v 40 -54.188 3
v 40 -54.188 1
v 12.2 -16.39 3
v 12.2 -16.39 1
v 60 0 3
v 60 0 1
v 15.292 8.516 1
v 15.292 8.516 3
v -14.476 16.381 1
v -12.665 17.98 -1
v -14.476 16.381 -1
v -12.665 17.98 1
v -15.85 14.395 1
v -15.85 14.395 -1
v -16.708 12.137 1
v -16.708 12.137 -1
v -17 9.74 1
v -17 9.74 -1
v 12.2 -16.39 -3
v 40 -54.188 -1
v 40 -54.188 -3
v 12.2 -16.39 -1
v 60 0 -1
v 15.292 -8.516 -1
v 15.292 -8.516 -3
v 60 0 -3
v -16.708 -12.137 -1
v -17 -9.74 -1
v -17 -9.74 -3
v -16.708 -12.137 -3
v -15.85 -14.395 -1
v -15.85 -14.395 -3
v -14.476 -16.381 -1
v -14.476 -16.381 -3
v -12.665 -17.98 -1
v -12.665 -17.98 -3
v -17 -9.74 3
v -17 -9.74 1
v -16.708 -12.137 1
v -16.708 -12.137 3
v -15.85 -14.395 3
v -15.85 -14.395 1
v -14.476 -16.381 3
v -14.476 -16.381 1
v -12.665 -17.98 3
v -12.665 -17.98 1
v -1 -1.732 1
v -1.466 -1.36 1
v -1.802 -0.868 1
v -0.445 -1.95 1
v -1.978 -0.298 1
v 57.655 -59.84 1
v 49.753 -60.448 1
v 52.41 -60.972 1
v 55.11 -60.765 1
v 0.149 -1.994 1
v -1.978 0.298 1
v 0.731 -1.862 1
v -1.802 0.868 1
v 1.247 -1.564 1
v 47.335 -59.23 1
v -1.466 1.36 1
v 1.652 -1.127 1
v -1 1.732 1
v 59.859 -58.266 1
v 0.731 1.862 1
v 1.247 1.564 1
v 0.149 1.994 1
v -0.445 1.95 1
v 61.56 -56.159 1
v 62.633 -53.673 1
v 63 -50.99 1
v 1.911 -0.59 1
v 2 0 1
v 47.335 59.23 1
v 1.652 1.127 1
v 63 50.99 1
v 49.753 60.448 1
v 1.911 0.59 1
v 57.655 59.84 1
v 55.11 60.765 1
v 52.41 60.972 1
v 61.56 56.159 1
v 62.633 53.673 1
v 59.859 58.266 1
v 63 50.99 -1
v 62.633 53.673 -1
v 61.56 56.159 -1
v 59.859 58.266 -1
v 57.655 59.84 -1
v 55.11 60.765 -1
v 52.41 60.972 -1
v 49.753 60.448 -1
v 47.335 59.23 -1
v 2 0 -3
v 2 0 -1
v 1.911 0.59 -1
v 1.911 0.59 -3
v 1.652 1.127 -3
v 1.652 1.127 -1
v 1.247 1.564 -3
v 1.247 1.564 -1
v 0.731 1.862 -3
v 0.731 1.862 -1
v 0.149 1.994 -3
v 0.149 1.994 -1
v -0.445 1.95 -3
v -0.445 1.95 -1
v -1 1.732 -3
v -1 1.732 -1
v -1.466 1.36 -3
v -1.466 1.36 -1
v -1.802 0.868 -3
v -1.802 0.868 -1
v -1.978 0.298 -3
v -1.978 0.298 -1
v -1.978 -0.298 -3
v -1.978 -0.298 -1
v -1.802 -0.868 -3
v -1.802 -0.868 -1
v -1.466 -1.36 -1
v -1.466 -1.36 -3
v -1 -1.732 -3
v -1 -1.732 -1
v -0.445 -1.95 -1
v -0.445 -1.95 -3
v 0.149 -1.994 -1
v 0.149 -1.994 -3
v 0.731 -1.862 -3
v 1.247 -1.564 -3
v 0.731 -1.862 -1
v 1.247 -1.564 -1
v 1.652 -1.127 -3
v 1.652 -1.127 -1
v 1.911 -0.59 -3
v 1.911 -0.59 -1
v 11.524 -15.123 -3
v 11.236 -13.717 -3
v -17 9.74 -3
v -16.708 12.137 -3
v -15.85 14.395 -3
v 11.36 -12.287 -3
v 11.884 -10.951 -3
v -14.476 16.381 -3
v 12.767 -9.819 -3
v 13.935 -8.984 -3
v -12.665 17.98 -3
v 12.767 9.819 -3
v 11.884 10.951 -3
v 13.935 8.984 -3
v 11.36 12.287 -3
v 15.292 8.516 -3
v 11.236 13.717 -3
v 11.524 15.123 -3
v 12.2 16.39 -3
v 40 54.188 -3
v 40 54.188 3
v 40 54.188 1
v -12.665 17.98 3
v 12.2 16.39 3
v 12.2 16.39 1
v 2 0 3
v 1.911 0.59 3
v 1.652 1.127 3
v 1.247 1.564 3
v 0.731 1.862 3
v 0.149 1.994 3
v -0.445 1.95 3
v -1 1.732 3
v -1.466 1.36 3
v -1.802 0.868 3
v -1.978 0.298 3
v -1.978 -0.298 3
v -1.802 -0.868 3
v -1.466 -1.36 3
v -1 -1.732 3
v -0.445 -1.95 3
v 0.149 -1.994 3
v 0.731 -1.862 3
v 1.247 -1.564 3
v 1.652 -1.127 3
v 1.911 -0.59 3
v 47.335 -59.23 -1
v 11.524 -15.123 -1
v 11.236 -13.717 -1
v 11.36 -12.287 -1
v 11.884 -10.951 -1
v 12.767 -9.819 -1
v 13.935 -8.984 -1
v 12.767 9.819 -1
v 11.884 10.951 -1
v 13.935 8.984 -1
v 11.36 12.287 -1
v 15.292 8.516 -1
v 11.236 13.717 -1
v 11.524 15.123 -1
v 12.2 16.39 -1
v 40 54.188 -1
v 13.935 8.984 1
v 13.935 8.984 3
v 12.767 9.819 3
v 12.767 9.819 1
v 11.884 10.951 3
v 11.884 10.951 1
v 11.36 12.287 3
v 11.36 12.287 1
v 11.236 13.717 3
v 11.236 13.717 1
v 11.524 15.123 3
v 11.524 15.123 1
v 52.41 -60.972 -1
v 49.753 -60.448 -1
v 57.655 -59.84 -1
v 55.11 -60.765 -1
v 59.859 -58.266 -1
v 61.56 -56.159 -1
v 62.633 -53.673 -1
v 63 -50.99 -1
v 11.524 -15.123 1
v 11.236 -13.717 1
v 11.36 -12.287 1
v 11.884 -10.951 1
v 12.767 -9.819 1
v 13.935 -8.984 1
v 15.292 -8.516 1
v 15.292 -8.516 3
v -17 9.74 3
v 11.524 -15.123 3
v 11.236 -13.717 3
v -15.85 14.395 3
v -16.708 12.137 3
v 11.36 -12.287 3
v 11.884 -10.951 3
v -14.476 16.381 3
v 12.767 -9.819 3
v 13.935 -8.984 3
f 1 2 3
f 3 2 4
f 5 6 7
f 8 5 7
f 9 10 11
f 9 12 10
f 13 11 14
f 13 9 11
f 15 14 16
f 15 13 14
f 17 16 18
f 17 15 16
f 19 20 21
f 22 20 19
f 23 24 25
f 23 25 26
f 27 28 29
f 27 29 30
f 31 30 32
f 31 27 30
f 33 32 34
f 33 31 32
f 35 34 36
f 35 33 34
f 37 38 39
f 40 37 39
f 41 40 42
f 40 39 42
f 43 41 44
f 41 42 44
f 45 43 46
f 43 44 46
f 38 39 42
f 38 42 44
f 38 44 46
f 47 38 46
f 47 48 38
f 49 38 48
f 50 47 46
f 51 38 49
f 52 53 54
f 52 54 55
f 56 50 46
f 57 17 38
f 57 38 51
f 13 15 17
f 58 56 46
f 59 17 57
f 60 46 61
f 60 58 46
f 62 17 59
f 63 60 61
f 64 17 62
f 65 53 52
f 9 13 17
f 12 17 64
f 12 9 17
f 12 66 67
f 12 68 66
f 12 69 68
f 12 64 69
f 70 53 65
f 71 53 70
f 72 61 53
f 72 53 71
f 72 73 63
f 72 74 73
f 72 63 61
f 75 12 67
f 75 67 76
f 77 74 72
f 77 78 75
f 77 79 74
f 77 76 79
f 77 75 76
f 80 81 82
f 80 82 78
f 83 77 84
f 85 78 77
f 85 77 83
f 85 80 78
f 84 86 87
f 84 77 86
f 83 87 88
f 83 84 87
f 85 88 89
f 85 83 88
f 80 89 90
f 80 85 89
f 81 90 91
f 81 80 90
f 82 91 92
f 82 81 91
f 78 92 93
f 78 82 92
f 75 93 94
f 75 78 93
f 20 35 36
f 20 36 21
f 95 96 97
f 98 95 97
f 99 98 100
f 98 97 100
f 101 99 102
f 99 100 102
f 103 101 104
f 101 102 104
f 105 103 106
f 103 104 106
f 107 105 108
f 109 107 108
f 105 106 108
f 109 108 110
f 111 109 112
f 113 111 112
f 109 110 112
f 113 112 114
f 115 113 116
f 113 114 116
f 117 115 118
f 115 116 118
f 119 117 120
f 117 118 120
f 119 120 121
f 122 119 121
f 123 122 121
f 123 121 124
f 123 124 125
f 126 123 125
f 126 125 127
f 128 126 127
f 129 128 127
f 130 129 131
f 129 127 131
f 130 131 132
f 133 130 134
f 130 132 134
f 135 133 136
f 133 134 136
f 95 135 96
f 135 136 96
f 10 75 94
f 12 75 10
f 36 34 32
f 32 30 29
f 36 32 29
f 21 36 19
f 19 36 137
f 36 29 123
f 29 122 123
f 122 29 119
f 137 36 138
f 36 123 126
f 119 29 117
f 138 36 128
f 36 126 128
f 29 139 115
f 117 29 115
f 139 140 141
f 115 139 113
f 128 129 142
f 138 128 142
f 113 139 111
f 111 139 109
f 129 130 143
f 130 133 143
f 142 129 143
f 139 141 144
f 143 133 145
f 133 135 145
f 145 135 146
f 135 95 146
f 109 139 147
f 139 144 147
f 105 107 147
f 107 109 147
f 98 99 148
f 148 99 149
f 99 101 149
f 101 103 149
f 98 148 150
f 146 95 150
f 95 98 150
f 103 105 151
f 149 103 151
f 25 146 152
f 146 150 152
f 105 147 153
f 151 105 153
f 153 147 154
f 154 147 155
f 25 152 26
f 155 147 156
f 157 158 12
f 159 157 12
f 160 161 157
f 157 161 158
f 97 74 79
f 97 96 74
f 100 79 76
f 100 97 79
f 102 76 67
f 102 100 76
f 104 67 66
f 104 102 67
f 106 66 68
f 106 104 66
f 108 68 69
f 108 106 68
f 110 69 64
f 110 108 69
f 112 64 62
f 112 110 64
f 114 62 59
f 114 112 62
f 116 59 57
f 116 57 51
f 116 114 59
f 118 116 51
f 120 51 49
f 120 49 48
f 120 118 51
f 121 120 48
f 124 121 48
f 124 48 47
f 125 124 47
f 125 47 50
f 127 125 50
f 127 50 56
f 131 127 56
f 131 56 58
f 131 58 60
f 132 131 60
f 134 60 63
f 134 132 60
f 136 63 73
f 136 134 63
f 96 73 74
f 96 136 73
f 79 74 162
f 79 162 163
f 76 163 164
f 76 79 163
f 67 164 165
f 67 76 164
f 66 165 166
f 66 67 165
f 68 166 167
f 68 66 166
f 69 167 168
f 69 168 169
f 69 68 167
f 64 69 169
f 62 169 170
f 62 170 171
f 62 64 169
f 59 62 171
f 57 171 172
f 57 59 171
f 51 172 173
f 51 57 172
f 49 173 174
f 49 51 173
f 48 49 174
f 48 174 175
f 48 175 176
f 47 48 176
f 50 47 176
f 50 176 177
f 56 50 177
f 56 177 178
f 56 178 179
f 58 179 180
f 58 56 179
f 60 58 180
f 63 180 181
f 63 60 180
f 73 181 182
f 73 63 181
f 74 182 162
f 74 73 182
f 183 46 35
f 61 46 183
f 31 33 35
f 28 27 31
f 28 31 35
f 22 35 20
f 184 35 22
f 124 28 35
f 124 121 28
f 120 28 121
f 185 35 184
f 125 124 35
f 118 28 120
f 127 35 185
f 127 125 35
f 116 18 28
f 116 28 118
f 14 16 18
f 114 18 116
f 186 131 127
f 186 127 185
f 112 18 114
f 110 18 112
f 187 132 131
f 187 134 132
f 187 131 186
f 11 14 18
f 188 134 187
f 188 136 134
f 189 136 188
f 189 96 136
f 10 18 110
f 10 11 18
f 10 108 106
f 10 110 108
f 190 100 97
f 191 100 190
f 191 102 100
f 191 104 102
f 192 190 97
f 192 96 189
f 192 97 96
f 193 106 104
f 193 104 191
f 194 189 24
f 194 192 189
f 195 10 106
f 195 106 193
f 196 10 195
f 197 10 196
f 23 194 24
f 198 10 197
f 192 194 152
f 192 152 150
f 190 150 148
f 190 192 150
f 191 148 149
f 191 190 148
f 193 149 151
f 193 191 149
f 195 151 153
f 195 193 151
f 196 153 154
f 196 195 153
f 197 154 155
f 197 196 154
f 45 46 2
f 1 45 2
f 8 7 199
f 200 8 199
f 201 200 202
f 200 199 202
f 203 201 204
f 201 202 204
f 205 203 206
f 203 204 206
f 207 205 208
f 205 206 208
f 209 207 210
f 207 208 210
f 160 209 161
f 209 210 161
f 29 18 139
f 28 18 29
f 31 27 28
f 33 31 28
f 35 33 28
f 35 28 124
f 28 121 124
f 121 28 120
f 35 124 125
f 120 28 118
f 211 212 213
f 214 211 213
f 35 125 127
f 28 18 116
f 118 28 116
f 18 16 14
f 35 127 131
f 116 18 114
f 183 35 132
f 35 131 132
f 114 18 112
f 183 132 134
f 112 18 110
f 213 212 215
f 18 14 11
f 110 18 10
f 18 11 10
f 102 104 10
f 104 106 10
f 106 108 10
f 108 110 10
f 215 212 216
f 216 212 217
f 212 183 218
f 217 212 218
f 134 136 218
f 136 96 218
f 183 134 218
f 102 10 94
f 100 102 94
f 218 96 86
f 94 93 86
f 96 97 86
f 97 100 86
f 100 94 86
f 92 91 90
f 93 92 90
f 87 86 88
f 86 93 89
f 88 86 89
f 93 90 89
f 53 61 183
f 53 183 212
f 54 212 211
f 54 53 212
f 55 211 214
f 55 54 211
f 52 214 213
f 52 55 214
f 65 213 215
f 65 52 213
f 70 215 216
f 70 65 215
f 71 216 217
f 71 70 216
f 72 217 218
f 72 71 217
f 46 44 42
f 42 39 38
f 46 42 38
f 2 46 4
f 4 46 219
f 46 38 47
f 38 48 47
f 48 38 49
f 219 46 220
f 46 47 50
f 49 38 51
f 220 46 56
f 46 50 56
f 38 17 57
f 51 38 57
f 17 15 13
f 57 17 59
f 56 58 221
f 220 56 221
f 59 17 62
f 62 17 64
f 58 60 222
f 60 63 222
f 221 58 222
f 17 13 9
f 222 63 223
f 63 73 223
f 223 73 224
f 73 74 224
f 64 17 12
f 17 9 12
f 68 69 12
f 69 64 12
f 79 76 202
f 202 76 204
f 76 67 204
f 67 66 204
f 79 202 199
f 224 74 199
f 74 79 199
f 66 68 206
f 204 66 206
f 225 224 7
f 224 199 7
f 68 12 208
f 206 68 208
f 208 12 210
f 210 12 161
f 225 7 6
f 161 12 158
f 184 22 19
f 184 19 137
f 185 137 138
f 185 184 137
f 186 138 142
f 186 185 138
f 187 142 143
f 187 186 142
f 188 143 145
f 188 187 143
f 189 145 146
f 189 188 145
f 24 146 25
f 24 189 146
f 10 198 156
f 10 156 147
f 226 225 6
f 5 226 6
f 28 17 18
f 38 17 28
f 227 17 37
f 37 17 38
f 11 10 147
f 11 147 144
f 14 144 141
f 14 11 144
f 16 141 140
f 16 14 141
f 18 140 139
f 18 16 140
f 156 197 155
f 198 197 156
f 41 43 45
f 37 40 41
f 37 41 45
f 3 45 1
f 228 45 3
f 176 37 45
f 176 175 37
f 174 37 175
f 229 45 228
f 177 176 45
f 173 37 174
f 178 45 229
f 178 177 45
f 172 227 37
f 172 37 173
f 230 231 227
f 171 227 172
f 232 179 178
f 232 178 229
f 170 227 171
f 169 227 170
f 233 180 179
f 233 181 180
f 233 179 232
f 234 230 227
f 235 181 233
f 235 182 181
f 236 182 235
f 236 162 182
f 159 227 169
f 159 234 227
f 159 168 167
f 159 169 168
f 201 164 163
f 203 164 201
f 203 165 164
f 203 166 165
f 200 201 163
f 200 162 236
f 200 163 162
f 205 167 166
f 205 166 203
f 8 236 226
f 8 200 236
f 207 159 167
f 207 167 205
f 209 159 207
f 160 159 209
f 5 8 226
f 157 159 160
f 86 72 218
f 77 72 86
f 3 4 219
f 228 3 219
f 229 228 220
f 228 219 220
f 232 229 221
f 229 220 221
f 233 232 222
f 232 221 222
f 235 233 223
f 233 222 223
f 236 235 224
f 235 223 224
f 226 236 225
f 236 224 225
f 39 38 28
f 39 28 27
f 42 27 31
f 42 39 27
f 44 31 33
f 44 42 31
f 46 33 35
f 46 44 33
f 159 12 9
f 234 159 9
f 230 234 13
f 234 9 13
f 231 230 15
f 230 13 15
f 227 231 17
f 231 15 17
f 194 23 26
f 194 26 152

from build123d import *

# Parameters (mm, degrees)
SKETCH1_R           = 2
BOSS_EXTRUDE1_DEPTH = 1
SKETCH2_R           = 2
BOSS_EXTRUDE2_DEPTH = 2


with BuildPart() as part:
    # Sketch1 → Boss-Extrude1 (new body, symmetric)
    with BuildSketch(Plane.XY):
        with BuildLine():
            Line((-17, 9.739695101), (-17, -9.739695101))
            ThreePointArc((-17, -9.739695101), (-15.850222661, -14.395182063), (-12.665288229, -17.980114343))
            Line((-12.665288229, -17.980114343), (47.334711771, -59.230114343))
            ThreePointArc((47.334711771, -59.230114343), (57.655486962, -59.839917761), (63, -50.989695101))
            Line((63, -50.989695101), (63, 50.989695101))
            ThreePointArc((63, 50.989695101), (57.655486962, 59.839917761), (47.334711771, 59.230114343))
            Line((47.334711771, 59.230114343), (-12.665288229, 17.980114343))
            ThreePointArc((-12.665288229, 17.980114343), (-15.850222661, 14.395182063), (-17, 9.739695101))
        make_face()
        Circle(SKETCH1_R, mode=Mode.SUBTRACT)
    extrude(amount=BOSS_EXTRUDE1_DEPTH, both=True)


with BuildPart() as body_2:
    # Sketch2 → Boss-Extrude2 (new body)
    with BuildSketch(Plane.XY.offset(1)):
        with BuildLine():
            Line((-17, 9.739695101), (-17, -9.739695101))
            ThreePointArc((-17, -9.739695101), (-15.850222661, -14.395182063), (-12.665288229, -17.980114343))
            Line((-12.665288229, -17.980114343), (40, -54.1875))
            Line((40, -54.1875), (12.199838689, -16.389972987))
            ThreePointArc((12.199838689, -16.389972987), (11.573707783, -11.599797128), (15.292133323, -8.515784129))
            Line((15.292133323, -8.515784129), (60, 0))
            Line((60, 0), (15.292133323, 8.515784129))
            ThreePointArc((15.292133323, 8.515784129), (11.573707783, 11.599797128), (12.199838689, 16.389972987))
            Line((12.199838689, 16.389972987), (40, 54.1875))
            Line((40, 54.1875), (-12.665288229, 17.980114343))
            ThreePointArc((-12.665288229, 17.980114343), (-15.850222661, 14.395182063), (-17, 9.739695101))
        make_face()
        Circle(SKETCH2_R, mode=Mode.SUBTRACT)
    extrude(amount=BOSS_EXTRUDE2_DEPTH)


with BuildPart() as body_3:
    # Mirror1: mirrored copy
    add(body_2.part.mirror(Plane.XY))


solid = Compound([part.part, body_2.part, body_3.part])
